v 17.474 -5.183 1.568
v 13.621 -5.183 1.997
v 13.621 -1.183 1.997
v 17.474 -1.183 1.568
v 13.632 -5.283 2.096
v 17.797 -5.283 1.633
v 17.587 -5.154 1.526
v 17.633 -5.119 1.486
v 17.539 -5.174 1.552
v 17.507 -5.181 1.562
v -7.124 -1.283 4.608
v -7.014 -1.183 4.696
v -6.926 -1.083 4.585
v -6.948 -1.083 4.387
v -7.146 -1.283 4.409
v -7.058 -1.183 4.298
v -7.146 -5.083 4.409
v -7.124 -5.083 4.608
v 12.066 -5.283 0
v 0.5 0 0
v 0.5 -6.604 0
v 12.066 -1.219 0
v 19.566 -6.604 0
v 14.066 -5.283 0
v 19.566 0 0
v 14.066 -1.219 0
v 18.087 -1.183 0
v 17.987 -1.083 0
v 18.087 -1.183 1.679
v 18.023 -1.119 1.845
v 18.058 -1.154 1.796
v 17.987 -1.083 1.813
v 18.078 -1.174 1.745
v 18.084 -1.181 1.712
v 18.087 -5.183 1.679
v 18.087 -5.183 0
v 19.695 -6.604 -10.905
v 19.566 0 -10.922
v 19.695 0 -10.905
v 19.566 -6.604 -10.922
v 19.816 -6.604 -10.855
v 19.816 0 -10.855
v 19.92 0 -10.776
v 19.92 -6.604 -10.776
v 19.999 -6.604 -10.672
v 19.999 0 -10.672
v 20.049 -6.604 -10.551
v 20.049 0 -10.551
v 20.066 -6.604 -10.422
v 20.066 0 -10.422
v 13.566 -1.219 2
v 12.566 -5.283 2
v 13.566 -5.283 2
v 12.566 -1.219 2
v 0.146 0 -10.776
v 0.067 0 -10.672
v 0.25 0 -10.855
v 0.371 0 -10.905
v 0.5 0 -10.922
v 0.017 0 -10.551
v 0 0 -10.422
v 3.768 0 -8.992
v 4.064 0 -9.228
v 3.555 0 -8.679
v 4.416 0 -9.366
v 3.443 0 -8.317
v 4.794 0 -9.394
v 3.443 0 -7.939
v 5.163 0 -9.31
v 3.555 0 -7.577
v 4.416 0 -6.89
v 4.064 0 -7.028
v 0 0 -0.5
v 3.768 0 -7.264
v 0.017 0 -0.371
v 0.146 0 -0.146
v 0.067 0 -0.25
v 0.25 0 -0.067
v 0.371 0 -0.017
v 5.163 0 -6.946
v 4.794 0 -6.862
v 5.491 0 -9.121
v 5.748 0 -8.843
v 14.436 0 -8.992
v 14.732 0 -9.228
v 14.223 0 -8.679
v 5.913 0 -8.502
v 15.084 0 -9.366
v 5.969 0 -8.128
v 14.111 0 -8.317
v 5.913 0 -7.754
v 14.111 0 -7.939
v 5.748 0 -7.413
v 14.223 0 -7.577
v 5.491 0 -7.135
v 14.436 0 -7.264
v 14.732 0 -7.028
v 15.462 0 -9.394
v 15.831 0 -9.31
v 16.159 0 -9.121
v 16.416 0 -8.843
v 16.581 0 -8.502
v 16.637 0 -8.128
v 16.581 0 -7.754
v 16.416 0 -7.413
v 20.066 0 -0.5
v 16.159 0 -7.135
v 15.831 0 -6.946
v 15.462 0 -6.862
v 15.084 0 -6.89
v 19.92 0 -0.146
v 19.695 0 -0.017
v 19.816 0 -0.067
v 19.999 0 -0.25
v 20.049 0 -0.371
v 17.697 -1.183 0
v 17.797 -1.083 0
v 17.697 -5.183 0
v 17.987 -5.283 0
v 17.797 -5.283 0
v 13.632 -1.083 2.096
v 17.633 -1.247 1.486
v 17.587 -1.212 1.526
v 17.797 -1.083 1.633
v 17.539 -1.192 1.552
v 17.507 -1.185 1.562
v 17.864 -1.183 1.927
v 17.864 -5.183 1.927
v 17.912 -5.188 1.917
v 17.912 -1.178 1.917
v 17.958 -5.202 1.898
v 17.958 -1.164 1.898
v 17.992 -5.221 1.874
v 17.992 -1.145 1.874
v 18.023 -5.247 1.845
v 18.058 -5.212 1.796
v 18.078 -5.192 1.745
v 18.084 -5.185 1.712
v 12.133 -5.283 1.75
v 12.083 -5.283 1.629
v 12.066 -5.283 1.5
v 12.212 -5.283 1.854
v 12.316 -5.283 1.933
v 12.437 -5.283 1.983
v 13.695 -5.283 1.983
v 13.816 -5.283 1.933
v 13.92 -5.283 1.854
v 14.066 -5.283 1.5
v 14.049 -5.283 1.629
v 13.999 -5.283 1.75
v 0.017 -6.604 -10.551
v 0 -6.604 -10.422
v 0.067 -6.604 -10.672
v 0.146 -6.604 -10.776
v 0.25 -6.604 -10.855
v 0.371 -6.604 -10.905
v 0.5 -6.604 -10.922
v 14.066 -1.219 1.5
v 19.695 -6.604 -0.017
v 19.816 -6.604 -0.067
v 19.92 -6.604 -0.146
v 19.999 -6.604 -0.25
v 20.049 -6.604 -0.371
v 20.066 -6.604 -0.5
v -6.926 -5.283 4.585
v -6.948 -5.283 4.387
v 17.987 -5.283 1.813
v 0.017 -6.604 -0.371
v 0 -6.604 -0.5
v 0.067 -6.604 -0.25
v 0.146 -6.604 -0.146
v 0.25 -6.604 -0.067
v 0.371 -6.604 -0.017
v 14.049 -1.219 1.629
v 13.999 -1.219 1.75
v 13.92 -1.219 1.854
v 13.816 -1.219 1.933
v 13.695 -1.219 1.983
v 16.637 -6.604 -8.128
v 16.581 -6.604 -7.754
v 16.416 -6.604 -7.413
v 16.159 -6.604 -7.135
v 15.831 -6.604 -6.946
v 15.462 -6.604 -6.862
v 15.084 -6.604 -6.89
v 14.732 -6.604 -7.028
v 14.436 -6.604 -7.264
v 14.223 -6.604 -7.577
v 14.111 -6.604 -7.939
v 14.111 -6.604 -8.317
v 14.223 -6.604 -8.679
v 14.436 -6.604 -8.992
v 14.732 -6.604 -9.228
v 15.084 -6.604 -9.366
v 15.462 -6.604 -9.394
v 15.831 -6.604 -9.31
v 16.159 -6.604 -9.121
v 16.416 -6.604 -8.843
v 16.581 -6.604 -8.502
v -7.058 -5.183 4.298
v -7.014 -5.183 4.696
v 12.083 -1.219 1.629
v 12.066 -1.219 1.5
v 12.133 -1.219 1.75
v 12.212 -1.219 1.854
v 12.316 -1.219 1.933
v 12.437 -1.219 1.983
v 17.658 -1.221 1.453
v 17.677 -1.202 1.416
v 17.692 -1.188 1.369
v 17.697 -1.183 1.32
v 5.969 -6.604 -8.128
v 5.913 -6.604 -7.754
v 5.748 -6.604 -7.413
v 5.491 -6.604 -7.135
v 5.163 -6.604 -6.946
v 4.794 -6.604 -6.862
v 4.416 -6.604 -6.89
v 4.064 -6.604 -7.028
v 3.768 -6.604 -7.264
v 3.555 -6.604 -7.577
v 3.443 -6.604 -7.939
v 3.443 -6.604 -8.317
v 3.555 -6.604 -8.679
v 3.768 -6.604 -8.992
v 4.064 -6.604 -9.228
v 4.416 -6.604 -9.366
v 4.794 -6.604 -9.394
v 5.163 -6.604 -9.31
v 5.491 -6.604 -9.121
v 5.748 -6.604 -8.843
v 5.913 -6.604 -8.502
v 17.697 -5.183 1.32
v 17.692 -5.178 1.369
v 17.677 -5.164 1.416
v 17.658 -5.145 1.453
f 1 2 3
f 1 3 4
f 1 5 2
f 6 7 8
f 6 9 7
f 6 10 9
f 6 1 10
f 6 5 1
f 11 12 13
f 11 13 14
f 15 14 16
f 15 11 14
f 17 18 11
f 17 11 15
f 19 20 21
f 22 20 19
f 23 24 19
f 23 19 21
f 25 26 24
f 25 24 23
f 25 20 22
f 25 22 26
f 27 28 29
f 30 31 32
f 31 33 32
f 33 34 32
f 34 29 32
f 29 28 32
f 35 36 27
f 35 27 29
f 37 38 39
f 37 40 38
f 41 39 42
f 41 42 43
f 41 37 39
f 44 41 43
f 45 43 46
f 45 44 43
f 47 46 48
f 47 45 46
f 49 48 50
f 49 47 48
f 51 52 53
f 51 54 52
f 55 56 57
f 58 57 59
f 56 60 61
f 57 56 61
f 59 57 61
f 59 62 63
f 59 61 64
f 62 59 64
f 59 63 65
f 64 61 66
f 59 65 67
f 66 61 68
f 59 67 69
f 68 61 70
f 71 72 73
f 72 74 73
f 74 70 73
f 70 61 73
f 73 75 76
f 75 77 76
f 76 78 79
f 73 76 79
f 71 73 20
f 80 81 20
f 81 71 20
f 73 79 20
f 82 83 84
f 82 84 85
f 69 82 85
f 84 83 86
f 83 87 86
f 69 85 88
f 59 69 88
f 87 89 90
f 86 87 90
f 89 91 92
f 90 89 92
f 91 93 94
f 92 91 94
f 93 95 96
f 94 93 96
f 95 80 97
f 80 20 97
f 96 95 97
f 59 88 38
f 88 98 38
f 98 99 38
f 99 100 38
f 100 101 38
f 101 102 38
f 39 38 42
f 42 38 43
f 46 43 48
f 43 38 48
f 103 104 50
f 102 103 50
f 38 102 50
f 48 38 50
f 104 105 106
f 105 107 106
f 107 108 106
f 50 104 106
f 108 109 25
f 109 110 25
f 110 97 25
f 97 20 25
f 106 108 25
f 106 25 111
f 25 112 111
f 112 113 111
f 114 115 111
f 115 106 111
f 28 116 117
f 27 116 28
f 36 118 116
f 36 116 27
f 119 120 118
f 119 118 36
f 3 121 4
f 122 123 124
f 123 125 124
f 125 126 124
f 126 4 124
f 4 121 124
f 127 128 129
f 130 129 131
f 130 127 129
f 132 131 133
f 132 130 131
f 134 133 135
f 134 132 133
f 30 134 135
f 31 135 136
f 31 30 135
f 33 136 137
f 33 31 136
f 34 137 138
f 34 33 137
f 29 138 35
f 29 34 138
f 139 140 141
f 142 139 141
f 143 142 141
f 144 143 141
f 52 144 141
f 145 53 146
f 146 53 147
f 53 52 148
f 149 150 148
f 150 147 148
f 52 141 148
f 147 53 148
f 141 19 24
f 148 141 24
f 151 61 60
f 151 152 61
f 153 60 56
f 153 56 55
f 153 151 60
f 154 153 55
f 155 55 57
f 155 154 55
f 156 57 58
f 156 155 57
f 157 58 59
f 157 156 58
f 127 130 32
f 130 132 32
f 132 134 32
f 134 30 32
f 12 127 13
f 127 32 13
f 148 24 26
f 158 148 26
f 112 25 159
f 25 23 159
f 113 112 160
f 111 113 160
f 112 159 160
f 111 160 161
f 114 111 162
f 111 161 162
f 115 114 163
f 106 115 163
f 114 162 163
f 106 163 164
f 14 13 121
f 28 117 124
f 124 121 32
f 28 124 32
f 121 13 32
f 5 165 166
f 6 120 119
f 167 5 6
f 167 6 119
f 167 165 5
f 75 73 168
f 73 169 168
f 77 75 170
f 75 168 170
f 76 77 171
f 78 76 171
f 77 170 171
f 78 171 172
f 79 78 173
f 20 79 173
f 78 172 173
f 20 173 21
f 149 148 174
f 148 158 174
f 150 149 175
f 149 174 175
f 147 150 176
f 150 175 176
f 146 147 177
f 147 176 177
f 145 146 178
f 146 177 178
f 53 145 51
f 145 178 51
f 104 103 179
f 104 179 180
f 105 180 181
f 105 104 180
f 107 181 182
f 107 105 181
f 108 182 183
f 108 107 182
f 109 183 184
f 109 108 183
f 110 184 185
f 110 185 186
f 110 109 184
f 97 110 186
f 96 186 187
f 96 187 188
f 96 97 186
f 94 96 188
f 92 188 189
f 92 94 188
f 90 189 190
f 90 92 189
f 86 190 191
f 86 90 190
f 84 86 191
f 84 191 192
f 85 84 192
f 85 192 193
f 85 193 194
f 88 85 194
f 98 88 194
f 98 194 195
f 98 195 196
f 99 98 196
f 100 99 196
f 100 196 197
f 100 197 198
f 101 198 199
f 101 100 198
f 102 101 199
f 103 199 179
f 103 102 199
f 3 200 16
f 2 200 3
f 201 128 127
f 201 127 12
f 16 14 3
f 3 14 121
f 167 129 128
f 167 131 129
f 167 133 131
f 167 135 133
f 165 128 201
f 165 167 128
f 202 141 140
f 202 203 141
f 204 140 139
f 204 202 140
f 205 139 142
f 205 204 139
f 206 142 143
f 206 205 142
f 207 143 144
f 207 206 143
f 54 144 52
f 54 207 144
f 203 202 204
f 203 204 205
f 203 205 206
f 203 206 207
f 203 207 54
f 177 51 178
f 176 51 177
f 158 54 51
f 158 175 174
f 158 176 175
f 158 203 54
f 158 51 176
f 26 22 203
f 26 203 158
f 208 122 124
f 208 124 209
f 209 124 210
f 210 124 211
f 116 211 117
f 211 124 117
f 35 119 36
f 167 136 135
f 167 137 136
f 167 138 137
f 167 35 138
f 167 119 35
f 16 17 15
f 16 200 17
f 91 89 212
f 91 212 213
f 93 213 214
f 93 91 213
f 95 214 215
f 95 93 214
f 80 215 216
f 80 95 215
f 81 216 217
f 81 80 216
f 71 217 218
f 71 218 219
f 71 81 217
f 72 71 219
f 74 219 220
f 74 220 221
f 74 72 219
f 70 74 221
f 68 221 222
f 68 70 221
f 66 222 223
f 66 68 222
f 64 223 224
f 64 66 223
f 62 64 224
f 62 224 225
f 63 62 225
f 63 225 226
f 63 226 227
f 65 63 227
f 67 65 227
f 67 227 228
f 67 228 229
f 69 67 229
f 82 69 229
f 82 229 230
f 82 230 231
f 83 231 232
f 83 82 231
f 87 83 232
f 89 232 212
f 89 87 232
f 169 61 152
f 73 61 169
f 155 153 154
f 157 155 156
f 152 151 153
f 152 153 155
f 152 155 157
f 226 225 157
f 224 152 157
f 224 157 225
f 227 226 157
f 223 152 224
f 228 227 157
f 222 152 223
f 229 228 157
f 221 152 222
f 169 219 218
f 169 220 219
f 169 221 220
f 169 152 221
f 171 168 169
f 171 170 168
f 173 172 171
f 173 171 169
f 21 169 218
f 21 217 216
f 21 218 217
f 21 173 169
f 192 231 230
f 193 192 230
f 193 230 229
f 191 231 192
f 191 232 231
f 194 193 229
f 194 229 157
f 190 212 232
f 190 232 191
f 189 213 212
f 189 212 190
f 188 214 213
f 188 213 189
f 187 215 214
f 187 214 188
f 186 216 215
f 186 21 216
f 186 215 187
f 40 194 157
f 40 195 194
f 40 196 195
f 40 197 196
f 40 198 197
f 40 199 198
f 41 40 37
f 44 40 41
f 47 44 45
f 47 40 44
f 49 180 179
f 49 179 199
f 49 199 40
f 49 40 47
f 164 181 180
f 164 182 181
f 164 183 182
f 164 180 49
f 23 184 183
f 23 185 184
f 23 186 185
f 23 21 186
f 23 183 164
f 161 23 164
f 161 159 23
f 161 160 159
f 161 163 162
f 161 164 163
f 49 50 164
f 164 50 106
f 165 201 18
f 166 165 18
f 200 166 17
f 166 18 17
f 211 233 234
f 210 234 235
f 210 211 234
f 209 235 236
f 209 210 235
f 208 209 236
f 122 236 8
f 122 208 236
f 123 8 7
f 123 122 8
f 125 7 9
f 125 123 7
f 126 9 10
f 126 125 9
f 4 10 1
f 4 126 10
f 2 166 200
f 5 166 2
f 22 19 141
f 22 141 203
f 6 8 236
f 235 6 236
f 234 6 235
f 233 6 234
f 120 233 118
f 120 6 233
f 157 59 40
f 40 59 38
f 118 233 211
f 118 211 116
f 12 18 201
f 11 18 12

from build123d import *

# Parameters (mm, degrees)
F0_W     = 20.066
F0_H     = 10.922
F0_R     = 1.27
F1_DEPTH = 6.604
F2_W     = 2
F2_H     = 4.064
F3_DEPTH = 2
F4_R     = 0.5
F7_DEPTH = 4.2
F8_SIZE  = 0.1
F9_SIZE  = 0.19999
F10_R    = 0.25


# Not quite as in the source:
# - a fillet or chamfer is up to 0.001 mm smaller than in the source, because OpenCascade refuses the exact size


with BuildPart() as f1:
    # F0 (on Front) → F1 (new body)
    with BuildSketch(Plane.XZ):
        with Locations((10.033, -5.461)):
            Rectangle(F0_W, F0_H)
        with Locations((4.699, -8.128)):
            Circle(F0_R, mode=Mode.SUBTRACT)
        with Locations((15.367, -8.128)):
            Circle(F0_R, mode=Mode.SUBTRACT)
    extrude(amount=F1_DEPTH)

    # F2 (on face) → F3 (join)
    with BuildSketch(Plane.XY):
        with Locations((13.066, -3.2510236964)):
            Rectangle(F2_W, F2_H)
    extrude(amount=F3_DEPTH)

    # F4
    f4_edges = [f1.edges().sort_by_distance(p)[0] for p in [
        (12.066, -3.251024, 2),
        (14.066, -3.251024, 2),
        (0, -3.302, 0),
        (20.066, -3.302, 0),
        (0, -3.302, -10.922),
        (20.066, -3.302, -10.922),
    ]]
    fillet(f4_edges, radius=F4_R)


with BuildPart() as f7:
    # F6 (on face) → F7 (new body)
    with BuildSketch(Plane.XZ.offset(5.2830236964)):
        Polygon((18.0865991861, 0), (18.0865991861, 1.5), (17.6965991861, 1.5434021702), (17.6965991861, 0), align=None)
        Polygon((17.6965991861, 1.5434021702), (18.0865991861, 1.5), (18.0865991861, 1.9024693645), (-7.1133163265, 4.7069078814), (-7.1575582493, 4.309362095), (13.6213023921, 1.9969322342), align=None)
    extrude(amount=-F7_DEPTH)

    # F8
    f8_edges = [f7.edges().sort_by_distance(p)[0] for p in [
        (18.086599, -5.283024, 0.951235),
        (5.486641, -5.283024, 3.304689),
        (5.26952, -5.283024, 2.926382),
        (17.696599, -5.283024, 0.771701),
        (18.086599, -1.083024, 0.951235),
        (5.486641, -1.083024, 3.304689),
        (17.696599, -1.083024, 0.771701),
        (5.26952, -1.083024, 2.926382),
        (-7.113316, -3.183024, 4.706908),
        (-7.157558, -3.183024, 4.309362),
    ]]
    chamfer(f8_edges, length=F8_SIZE)

    # F9 (size 0.2 in the source; OpenCascade refuses exactly that, so slightly less here)
    f9_edges = [f7.edges().sort_by_distance(p)[0] for p in [
        (-7.135437, -5.283024, 4.508135),
        (-7.135437, -1.083024, 4.508135),
    ]]
    chamfer(f9_edges, length=F9_SIZE)

    # F10
    f10_edges = [f7.edges().sort_by_distance(p)[0] for p in [
        (17.696599, -3.183024, 1.543402),
        (18.086599, -3.183024, 1.902469),
    ]]
    fillet(f10_edges, radius=F10_R)


solid = Compound([f1.part, f7.part])
